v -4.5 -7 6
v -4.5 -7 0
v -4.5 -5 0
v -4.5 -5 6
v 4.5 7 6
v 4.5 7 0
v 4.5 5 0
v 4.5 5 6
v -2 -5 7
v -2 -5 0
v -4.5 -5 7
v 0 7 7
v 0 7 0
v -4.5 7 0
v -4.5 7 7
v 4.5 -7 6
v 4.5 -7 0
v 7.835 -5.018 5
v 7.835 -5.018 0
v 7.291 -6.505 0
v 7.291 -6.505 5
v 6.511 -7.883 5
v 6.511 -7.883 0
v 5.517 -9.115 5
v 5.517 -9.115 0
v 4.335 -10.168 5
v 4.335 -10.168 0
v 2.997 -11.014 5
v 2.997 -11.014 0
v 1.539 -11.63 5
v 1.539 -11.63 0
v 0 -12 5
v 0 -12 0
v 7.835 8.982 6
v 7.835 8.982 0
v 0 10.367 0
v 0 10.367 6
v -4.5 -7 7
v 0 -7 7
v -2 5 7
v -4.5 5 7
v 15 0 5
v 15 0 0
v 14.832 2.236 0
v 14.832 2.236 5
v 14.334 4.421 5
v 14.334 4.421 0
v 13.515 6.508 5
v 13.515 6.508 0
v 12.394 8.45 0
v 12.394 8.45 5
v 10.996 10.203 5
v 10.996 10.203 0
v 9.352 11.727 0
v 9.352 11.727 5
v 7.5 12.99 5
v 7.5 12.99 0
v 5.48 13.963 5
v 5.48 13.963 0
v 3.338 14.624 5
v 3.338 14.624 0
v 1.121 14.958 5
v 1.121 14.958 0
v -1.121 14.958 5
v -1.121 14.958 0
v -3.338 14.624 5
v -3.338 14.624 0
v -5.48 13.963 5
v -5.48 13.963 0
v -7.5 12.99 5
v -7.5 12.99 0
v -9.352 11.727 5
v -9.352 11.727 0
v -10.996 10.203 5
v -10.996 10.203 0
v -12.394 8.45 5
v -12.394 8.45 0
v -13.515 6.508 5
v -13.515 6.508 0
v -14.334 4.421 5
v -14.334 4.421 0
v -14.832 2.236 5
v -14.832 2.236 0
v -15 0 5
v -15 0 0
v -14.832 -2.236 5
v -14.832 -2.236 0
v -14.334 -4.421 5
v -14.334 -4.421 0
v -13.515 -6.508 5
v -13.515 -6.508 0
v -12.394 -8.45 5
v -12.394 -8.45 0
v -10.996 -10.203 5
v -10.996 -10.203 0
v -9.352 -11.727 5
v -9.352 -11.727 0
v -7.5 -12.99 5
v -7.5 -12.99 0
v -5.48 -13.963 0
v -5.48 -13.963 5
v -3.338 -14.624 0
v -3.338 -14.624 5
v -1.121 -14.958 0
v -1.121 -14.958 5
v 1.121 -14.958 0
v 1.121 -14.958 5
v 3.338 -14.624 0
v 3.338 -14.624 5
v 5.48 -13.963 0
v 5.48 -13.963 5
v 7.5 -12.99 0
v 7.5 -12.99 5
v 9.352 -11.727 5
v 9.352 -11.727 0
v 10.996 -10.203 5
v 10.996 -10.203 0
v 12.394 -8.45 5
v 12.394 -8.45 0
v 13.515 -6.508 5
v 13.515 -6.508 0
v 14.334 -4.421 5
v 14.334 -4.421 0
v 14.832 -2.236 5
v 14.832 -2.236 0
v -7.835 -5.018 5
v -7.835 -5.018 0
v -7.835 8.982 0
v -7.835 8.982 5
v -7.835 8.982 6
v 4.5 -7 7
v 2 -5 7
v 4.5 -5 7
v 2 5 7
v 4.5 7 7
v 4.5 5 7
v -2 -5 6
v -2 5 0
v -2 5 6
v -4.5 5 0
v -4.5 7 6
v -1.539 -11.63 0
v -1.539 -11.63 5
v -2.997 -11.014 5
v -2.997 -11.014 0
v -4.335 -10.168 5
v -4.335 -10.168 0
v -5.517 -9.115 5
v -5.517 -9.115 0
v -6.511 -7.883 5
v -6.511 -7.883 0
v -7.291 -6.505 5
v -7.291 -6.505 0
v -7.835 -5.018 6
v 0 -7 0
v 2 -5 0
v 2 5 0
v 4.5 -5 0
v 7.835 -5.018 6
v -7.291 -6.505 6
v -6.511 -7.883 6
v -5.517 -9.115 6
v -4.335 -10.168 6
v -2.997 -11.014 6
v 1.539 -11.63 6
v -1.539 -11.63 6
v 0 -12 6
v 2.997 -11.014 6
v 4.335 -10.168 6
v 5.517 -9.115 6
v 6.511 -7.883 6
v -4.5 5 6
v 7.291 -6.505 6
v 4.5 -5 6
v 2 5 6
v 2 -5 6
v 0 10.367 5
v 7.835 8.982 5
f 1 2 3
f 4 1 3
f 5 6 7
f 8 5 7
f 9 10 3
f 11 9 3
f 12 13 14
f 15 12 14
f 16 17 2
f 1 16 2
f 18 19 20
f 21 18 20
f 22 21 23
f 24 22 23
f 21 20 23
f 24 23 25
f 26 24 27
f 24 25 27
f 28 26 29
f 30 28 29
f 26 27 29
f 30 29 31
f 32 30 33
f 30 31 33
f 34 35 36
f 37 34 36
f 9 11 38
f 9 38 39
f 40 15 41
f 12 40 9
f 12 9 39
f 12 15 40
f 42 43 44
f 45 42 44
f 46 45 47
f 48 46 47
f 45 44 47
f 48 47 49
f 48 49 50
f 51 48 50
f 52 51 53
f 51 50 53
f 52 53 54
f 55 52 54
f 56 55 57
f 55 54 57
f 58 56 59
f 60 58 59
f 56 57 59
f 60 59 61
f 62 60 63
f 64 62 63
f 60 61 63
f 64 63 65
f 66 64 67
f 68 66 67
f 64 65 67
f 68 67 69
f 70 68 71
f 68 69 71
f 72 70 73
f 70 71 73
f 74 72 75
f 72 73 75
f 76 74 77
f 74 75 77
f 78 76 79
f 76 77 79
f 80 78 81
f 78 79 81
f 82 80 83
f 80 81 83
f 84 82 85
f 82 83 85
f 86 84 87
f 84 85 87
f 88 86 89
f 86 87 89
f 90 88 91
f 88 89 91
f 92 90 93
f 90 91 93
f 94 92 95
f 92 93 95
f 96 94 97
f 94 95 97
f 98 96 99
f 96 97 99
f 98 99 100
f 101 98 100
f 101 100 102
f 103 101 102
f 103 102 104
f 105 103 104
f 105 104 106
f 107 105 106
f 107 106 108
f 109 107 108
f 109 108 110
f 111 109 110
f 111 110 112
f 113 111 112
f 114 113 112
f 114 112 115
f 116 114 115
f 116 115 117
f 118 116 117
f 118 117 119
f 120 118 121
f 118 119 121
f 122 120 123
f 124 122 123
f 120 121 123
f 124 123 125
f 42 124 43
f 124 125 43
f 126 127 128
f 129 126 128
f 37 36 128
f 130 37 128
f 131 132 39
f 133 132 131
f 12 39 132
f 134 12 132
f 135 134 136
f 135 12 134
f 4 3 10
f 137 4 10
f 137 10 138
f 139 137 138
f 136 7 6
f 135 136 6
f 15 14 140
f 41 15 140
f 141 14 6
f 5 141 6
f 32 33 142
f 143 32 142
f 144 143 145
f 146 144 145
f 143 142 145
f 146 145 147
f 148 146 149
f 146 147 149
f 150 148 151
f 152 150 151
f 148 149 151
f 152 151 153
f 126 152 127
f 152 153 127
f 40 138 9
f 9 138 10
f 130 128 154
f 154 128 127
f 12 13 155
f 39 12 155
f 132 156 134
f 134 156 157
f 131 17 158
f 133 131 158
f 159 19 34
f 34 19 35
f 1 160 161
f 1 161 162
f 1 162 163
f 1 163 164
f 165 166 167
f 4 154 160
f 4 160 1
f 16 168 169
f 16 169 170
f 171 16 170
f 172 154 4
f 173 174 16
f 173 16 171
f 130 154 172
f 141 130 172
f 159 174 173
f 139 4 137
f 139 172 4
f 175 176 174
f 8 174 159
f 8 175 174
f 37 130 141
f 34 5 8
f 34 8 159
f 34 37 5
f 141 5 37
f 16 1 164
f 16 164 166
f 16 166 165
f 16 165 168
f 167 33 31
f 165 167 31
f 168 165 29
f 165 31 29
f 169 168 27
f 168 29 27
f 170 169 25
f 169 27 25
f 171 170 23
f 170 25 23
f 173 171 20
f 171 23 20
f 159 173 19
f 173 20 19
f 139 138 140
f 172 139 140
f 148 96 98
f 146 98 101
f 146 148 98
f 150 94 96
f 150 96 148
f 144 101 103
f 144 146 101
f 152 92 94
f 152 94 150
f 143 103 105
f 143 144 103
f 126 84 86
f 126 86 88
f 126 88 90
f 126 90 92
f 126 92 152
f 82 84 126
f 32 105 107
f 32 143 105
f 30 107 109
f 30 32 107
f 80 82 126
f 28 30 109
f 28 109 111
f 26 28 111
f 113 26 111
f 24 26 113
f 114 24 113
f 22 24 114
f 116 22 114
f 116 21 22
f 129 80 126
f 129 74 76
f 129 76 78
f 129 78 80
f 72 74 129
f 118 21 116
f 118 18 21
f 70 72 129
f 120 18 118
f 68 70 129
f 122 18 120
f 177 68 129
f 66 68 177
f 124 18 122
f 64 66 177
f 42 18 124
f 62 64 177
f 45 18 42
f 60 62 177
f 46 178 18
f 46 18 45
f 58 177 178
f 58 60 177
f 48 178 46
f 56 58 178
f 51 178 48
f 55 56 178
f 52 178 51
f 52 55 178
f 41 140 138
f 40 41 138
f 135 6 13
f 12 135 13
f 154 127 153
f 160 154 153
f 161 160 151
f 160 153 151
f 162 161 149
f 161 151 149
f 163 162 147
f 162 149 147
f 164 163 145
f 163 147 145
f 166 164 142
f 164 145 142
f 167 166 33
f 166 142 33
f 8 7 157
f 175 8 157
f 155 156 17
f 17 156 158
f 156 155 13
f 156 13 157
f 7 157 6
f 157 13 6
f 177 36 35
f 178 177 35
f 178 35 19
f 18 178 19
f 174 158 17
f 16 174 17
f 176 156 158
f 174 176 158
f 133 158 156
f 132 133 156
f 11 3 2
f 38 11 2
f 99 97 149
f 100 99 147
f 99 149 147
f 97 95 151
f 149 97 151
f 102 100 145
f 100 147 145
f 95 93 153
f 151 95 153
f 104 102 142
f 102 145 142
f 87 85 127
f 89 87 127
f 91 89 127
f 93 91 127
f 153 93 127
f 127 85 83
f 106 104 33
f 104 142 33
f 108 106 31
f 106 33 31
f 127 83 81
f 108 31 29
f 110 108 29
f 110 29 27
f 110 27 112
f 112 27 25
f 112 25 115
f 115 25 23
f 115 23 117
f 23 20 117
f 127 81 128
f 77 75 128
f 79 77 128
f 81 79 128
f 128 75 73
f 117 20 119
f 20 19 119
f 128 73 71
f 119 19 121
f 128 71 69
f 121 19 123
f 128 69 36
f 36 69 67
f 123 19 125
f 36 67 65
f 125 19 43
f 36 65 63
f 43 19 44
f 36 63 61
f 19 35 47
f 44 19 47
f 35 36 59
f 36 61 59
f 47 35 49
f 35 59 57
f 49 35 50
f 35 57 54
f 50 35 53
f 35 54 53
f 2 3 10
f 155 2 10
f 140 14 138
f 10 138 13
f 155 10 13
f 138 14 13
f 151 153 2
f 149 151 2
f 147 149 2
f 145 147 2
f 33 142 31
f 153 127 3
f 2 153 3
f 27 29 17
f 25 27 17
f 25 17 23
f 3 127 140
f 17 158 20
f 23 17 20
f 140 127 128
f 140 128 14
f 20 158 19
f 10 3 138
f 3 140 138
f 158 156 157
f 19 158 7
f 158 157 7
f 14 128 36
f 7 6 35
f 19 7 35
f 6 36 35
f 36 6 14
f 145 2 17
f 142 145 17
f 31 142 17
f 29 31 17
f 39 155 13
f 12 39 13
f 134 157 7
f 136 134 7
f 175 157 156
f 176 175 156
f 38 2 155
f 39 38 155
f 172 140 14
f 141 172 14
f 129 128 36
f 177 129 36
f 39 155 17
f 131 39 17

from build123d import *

# Parameters (mm, degrees)
F0_R     = 15
F1_DEPTH = 5
F2_DEPTH = 6
F3_DEPTH = 7
F4_DEPTH = 7


with BuildPart() as f1:
    # F0 (on Top) → F1 (new body)
    with BuildSketch(Plane.XY):
        Circle(F0_R)
        with BuildLine():
            Line((-7.835095, 8.981931), (0, 10.366618))
            Line((0, 10.366618), (7.835095, 8.981931))
            Line((7.835095, 8.981931), (7.835095, -5.018069))
            ThreePointArc((7.835095, -5.018069), (4.948034, -9.665443), (0, -12))
            ThreePointArc((0, -12), (-4.948034, -9.665443), (-7.835095, -5.018069))
            Line((-7.835095, -5.018069), (-7.835095, 8.981931))
        make_face(mode=Mode.SUBTRACT)
    extrude(amount=F1_DEPTH)


with BuildPart() as f2:
    # F0 (on Top) → F2 (new body)
    with BuildSketch(Plane.XY):
        with BuildLine():
            Line((7.835095, 8.981931), (0, 10.366618))
            Line((0, 10.366618), (-7.835095, 8.981931))
            Line((-7.835095, 8.981931), (-7.835095, -5.018069))
            ThreePointArc((-7.835095, -5.018069), (-4.948034, -9.665443), (0, -12))
            ThreePointArc((0, -12), (4.948034, -9.665443), (7.835095, -5.018069))
            Line((7.835095, -5.018069), (7.835095, 8.981931))
        make_face()
        Polygon((-4.5, 5), (-4.5, 7), (0, 7), (4.5, 7), (4.5, 5), (2, 5), (2, -5), (4.5, -5), (4.5, -7), (0, -7), (-4.5, -7), (-4.5, -5), (-2, -5), (-2, 5), align=None, mode=Mode.SUBTRACT)
    extrude(amount=F2_DEPTH)


with BuildPart() as f3:
    # F0 (on Top) → F3 (new body)
    with BuildSketch(Plane.XY):
        Polygon((0, 7), (-4.5, 7), (-4.5, 5), (-2, 5), (-2, -5), (-4.5, -5), (-4.5, -7), (0, -7), align=None)
    extrude(amount=F3_DEPTH)


with BuildPart() as f4:
    # F0 (on Top) → F4 (new body)
    with BuildSketch(Plane.XY):
        Polygon((4.5, 7), (0, 7), (0, -7), (4.5, -7), (4.5, -5), (2, -5), (2, 5), (4.5, 5), align=None)
    extrude(amount=F4_DEPTH)


solid = Compound([f1.part, f2.part, f3.part, f4.part])
